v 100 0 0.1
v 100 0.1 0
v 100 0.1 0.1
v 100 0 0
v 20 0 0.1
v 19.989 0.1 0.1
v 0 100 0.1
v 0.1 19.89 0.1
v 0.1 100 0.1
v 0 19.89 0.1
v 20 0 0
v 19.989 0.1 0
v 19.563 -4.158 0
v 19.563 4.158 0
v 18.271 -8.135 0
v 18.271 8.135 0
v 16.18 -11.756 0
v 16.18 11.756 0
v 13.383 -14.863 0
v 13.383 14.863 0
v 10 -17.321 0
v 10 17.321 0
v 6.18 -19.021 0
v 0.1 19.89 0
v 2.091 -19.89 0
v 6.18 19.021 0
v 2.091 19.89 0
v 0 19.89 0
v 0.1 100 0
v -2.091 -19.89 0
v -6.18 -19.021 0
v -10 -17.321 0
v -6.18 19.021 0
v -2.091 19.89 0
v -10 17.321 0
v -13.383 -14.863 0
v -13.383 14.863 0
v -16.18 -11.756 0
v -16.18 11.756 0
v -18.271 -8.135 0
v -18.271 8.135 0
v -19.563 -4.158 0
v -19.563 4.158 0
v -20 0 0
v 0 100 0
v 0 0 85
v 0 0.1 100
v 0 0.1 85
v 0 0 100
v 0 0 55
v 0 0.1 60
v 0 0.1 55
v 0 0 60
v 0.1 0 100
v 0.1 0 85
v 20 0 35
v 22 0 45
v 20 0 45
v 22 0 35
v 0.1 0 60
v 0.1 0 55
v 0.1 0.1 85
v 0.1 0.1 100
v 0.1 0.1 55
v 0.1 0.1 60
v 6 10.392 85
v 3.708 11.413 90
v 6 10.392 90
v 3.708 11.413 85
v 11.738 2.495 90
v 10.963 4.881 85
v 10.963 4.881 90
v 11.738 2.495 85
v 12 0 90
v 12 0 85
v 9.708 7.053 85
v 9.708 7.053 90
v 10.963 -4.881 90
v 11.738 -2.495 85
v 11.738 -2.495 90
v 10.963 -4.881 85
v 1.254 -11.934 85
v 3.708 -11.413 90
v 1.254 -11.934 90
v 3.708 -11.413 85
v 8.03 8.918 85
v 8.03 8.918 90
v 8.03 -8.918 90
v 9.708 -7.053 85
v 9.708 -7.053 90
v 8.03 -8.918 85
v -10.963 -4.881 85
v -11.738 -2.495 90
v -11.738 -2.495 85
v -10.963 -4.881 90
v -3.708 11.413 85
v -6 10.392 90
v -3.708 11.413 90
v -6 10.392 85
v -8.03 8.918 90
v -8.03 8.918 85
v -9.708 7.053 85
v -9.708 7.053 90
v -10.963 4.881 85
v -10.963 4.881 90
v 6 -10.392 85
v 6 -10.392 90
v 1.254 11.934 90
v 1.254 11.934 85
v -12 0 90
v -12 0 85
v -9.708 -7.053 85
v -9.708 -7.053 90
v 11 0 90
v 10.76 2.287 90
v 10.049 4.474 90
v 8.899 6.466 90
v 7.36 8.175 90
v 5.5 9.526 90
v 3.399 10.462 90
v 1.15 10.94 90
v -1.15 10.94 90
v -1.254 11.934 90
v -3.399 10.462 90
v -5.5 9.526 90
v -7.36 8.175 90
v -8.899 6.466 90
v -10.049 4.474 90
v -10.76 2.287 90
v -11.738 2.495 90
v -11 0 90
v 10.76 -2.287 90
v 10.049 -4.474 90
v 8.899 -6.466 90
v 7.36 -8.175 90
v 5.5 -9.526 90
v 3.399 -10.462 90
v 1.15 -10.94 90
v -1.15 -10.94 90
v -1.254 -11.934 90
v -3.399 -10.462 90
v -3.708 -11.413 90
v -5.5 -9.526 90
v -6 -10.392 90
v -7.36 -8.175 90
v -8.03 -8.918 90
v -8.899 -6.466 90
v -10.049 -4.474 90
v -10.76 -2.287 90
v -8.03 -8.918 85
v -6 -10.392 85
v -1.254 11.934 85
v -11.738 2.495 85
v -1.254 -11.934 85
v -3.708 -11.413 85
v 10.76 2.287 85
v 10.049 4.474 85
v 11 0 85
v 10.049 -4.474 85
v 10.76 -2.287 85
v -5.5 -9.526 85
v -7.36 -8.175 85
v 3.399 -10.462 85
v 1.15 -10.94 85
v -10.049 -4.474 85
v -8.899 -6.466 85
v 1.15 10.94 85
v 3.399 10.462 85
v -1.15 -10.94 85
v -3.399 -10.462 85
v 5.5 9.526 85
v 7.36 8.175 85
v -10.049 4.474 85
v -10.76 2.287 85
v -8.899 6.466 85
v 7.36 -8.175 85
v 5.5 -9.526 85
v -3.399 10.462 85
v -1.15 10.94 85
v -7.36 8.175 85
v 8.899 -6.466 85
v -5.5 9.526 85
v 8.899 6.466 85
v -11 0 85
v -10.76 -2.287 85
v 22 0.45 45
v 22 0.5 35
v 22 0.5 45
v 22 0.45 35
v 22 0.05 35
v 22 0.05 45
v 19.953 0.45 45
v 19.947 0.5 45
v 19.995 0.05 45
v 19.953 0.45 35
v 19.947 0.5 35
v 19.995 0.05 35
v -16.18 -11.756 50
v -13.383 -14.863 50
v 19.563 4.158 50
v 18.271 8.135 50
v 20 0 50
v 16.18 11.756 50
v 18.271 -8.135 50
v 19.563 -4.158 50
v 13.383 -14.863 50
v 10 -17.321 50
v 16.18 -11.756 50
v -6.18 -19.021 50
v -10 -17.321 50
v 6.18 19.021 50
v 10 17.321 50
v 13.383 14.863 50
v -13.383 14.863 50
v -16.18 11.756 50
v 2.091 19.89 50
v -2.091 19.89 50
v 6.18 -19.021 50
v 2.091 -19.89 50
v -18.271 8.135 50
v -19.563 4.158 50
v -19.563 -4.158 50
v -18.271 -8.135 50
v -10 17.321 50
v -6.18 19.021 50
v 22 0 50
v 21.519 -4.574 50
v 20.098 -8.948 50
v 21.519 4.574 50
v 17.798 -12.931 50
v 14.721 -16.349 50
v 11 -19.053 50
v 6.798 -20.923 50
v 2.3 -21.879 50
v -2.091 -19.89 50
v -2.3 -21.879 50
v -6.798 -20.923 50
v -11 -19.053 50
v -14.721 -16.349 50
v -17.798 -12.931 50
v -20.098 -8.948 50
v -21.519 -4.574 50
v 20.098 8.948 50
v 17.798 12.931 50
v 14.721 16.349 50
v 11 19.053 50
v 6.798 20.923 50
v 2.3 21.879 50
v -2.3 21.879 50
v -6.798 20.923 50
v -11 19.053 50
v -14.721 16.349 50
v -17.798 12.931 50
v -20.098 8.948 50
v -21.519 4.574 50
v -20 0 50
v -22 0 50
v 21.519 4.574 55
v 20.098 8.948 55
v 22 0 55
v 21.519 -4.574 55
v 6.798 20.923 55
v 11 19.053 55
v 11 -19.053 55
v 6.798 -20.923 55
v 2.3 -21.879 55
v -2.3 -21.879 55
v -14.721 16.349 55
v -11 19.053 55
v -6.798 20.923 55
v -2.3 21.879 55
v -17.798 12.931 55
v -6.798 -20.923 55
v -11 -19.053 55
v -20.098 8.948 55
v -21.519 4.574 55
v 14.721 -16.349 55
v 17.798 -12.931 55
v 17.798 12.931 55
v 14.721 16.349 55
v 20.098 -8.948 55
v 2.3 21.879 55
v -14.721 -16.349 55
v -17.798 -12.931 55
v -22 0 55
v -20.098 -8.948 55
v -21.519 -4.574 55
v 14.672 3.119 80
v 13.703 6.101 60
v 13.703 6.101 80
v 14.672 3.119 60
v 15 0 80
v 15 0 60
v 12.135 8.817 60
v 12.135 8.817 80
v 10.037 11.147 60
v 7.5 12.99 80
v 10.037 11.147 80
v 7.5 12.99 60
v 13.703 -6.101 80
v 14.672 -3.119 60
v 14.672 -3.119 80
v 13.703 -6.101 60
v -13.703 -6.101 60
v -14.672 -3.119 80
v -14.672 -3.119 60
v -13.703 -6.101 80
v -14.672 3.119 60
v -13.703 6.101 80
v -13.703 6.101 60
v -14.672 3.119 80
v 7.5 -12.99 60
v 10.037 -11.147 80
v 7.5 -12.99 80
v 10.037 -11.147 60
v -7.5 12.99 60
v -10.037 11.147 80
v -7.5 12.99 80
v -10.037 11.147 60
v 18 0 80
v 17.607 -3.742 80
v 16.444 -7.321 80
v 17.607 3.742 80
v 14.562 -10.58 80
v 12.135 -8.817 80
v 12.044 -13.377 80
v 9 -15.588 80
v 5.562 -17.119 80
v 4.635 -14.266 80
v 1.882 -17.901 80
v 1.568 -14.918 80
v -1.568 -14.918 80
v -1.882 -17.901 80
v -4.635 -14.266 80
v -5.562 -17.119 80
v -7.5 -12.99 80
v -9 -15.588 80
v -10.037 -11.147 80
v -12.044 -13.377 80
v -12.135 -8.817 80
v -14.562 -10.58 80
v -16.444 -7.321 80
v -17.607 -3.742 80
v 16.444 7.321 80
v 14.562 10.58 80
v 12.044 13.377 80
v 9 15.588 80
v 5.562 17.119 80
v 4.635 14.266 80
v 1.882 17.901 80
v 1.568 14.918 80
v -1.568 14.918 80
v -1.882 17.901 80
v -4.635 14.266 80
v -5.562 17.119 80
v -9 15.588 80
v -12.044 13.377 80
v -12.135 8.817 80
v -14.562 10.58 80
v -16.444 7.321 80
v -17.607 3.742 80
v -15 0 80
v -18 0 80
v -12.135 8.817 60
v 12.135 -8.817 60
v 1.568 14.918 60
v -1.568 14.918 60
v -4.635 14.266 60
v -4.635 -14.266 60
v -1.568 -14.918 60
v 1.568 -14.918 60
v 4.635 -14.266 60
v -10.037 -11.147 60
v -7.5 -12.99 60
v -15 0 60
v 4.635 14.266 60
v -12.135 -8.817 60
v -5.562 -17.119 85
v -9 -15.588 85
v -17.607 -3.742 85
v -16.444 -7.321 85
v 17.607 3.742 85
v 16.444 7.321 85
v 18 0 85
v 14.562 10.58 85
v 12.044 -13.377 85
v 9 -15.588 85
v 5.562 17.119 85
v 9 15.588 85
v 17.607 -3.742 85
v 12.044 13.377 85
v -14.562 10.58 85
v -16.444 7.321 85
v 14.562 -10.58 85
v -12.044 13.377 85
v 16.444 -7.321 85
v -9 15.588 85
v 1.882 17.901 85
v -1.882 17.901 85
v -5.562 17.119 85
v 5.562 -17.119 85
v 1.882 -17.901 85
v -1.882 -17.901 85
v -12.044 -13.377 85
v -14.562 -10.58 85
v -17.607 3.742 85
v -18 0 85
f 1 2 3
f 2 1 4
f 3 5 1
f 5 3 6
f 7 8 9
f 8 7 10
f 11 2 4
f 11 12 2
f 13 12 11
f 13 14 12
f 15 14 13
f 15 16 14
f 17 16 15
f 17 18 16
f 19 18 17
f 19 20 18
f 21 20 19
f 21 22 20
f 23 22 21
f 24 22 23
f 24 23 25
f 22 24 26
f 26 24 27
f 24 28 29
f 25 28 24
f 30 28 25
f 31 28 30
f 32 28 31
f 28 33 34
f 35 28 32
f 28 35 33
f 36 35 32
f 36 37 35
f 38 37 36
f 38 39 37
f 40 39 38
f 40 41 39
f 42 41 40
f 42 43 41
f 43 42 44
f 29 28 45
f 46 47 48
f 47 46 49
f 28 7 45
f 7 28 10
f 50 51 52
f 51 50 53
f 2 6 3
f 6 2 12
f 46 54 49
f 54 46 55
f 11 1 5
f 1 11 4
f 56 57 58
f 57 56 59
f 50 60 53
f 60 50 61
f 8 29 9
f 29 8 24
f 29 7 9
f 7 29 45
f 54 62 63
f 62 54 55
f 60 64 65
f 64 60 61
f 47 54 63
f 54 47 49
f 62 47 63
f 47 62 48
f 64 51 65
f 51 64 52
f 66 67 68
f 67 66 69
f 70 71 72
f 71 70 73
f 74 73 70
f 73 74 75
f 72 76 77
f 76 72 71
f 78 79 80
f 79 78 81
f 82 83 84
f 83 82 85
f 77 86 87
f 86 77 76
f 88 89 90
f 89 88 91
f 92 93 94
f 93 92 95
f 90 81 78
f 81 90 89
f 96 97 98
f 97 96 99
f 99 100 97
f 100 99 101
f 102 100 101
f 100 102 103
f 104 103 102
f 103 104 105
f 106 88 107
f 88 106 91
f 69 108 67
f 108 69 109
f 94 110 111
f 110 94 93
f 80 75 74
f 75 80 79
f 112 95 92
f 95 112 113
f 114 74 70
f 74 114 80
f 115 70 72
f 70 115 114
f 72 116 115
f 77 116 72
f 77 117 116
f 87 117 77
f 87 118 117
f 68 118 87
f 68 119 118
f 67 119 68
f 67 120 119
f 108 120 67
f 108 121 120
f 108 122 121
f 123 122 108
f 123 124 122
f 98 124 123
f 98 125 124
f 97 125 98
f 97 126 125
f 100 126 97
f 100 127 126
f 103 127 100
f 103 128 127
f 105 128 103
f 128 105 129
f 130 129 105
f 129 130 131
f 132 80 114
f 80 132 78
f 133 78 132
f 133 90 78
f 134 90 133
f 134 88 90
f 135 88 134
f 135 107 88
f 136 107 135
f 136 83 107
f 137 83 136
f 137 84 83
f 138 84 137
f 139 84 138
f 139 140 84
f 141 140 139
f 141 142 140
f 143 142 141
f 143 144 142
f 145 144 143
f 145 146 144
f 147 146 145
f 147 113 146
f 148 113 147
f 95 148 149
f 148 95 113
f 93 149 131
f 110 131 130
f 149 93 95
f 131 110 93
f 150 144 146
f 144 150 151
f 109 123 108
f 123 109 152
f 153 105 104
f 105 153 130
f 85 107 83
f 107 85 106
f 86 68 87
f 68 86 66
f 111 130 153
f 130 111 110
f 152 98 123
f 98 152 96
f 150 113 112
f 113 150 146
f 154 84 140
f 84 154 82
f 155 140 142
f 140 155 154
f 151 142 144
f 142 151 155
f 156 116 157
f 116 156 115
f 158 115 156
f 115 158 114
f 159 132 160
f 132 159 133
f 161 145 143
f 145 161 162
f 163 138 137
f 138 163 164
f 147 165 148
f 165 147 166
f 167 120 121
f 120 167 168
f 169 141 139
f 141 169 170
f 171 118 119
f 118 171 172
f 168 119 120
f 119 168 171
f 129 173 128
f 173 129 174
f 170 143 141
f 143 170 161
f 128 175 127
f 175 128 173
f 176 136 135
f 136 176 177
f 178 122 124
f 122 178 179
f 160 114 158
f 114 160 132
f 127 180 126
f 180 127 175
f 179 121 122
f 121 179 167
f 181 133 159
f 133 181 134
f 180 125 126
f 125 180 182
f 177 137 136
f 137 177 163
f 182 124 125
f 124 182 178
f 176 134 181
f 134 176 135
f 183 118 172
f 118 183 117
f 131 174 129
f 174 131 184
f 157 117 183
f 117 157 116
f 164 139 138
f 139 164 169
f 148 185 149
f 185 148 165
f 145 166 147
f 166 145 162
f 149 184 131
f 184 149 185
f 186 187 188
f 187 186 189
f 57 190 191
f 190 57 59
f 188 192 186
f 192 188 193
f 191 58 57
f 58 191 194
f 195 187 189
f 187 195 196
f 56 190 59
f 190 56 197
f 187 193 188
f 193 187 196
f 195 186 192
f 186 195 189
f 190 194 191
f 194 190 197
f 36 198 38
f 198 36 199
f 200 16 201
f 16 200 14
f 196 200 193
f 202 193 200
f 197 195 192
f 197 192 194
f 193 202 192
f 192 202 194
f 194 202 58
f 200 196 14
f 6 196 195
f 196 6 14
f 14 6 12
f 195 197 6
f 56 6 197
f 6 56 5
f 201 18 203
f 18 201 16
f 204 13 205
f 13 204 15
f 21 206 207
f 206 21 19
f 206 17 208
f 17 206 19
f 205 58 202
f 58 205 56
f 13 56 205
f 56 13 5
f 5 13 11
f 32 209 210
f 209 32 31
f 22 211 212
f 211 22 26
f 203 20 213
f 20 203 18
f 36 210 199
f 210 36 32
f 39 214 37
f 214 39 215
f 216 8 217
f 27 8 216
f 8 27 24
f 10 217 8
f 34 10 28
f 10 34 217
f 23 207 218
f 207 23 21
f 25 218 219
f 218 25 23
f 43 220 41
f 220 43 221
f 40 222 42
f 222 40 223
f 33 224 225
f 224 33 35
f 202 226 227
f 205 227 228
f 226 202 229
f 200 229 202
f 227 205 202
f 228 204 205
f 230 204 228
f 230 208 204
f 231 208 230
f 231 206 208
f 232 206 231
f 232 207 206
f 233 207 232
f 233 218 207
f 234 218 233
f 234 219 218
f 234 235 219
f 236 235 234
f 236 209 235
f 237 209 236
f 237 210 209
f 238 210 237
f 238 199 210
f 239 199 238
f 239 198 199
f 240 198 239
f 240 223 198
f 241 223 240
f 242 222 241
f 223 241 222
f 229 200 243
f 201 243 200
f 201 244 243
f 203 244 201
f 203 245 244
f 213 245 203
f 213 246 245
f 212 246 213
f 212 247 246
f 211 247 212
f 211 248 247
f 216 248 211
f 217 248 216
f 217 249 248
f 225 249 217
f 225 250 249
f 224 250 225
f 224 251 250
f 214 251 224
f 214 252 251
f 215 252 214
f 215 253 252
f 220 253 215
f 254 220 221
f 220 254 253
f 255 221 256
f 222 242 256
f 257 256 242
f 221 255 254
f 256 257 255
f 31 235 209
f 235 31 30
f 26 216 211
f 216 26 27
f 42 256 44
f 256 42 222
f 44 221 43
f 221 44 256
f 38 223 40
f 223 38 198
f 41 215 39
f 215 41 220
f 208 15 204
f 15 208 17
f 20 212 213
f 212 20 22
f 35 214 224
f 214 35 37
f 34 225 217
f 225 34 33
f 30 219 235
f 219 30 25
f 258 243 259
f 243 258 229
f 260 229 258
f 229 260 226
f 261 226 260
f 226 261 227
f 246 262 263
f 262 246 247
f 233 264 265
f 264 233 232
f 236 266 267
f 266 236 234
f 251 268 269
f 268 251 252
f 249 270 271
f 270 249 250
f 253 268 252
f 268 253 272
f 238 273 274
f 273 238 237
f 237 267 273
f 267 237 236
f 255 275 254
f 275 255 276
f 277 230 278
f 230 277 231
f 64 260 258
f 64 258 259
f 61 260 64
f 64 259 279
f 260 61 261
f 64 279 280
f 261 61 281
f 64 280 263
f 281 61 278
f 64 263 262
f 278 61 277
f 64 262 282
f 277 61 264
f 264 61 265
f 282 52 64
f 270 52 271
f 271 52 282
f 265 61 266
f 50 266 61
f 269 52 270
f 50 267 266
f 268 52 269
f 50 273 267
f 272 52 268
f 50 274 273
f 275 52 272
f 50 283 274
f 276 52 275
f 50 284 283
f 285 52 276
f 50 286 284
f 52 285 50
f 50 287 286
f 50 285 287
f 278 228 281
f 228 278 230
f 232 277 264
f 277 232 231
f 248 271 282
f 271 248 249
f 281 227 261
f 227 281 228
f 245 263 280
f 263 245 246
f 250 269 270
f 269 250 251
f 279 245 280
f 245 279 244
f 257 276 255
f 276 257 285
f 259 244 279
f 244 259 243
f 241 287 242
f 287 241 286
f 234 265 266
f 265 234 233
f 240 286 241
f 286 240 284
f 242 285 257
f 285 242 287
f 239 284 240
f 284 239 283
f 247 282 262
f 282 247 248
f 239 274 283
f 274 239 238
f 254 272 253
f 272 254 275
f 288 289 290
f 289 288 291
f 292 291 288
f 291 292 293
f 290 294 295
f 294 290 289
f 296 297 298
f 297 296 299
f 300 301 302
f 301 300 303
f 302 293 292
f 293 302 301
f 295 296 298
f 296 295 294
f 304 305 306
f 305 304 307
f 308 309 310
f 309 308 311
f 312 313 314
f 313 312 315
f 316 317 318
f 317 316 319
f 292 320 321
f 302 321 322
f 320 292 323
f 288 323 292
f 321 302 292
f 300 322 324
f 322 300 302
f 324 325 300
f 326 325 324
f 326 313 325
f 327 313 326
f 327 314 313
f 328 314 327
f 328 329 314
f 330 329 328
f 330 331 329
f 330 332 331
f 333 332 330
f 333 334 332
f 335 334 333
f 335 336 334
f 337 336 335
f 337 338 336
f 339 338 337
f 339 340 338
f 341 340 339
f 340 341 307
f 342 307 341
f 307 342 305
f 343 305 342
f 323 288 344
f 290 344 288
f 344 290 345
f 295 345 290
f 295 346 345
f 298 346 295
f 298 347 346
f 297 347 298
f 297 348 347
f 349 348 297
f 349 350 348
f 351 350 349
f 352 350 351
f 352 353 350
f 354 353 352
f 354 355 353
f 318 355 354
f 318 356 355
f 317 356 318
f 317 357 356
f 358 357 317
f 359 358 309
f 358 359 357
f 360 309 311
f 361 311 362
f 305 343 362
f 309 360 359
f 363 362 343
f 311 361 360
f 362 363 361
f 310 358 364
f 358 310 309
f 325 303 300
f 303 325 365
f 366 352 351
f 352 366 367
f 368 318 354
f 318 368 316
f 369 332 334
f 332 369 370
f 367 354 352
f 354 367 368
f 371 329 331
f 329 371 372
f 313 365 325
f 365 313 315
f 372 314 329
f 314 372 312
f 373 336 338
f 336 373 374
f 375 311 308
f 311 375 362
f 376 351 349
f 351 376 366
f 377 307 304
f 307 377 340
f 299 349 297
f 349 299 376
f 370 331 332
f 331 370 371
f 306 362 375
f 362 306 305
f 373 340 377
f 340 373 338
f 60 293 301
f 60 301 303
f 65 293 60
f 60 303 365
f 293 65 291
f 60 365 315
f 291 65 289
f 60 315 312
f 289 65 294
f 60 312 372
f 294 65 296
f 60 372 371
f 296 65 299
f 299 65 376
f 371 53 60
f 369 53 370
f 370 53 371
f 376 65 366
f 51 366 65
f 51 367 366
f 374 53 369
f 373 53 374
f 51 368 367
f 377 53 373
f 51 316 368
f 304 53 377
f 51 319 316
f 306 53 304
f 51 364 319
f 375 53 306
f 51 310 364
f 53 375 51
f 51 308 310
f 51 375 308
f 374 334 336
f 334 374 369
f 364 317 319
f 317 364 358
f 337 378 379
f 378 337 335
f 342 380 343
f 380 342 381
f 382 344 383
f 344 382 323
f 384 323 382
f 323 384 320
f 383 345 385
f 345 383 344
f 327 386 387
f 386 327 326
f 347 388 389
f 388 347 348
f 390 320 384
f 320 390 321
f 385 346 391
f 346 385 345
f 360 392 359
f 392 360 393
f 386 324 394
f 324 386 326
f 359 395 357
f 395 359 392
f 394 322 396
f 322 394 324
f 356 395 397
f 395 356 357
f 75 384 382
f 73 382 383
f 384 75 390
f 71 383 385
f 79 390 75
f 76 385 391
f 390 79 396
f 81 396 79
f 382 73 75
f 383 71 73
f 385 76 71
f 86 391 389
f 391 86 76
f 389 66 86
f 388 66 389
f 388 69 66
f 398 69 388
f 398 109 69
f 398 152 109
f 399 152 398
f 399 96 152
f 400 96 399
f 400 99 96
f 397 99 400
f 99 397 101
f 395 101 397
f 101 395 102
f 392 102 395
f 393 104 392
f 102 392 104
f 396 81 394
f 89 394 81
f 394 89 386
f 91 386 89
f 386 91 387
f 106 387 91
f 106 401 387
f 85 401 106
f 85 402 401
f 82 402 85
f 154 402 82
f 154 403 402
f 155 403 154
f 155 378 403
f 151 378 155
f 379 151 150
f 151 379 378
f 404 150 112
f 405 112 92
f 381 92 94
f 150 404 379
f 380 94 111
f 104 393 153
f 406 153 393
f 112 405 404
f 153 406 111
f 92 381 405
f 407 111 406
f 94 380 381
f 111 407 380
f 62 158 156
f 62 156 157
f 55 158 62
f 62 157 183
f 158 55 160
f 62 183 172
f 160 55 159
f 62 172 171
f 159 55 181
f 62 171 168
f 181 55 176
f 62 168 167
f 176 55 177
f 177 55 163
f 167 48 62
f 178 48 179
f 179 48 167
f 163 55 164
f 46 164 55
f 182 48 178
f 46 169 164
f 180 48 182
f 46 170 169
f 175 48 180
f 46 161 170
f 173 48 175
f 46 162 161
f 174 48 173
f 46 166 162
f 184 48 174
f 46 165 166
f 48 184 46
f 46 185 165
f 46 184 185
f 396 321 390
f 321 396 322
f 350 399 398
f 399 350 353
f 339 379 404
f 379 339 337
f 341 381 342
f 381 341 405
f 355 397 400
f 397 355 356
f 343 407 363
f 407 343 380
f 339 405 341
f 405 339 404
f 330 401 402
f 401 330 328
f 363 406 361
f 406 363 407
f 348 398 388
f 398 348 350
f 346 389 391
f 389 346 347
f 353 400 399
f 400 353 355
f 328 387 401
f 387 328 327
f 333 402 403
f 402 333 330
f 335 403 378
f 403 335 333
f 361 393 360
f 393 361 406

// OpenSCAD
    // Combined Scene

    // Permanent Model
    
    // Permanent Model (Black)
    color([0, 0, 0]) {
        // Your permanent model code here
        cube([100,0.1,0.1], center = false);
        cube([0.1,100,0.1], center = false);
        cube([0.1,0.1,100], center = false);
    }
    

    // Dynamic Model
    cylinder(h = 50, r = 20); // Main body as a true cylinder

translate([0, 0, 50]) {
    scale([1.1, 1.1, 0.5])
        cylinder(h = 10, r1 = 20, r2 = 20); // Softer transition to neck
}

translate([0, 0, 60]) {
    cylinder(h = 20, r = 15); // Consistent neck with a uniform diameter
}

translate([0, 0, 80]) {
    cylinder(h = 5, r = 18); // Flat base for stability with wider radius
}

translate([0, 0, 80]) {
    difference() {
        cylinder(h = 10, r = 12); // Cap body with flat profile
        translate([0, 0, -1])
            cylinder(h = 11, r = 11); // Indentation for cap
    }
}

translate([0, 0, 75]) {
    for (i = [0 : 11]) {
        rotate(i * 30) {
            translate([0, 5, 0]) {
                cube([1, 0.2, 5]); // Ribbed texture along the neck
            }
        }
    }
}

translate([0, 0, 35]) {
    difference() {
        cube([22, 0.5, 10]); // Labeling area with distinct flat surface
        translate([0, 0.05, 0]) 
            cube([22, 0.4, 10]); // Indentation for label
    }
}

// Adding subtle detailing - small indentations along the bottle
translate([0, 0, 20]) {
    for (i = [0 : 12]) {
        rotate(i * 30) {
            translate([0, 10, 0]) {
                cylinder(h = 2, r = 1, center = true); // Slight indentations for detailing
            }
        }
    }
}
    
